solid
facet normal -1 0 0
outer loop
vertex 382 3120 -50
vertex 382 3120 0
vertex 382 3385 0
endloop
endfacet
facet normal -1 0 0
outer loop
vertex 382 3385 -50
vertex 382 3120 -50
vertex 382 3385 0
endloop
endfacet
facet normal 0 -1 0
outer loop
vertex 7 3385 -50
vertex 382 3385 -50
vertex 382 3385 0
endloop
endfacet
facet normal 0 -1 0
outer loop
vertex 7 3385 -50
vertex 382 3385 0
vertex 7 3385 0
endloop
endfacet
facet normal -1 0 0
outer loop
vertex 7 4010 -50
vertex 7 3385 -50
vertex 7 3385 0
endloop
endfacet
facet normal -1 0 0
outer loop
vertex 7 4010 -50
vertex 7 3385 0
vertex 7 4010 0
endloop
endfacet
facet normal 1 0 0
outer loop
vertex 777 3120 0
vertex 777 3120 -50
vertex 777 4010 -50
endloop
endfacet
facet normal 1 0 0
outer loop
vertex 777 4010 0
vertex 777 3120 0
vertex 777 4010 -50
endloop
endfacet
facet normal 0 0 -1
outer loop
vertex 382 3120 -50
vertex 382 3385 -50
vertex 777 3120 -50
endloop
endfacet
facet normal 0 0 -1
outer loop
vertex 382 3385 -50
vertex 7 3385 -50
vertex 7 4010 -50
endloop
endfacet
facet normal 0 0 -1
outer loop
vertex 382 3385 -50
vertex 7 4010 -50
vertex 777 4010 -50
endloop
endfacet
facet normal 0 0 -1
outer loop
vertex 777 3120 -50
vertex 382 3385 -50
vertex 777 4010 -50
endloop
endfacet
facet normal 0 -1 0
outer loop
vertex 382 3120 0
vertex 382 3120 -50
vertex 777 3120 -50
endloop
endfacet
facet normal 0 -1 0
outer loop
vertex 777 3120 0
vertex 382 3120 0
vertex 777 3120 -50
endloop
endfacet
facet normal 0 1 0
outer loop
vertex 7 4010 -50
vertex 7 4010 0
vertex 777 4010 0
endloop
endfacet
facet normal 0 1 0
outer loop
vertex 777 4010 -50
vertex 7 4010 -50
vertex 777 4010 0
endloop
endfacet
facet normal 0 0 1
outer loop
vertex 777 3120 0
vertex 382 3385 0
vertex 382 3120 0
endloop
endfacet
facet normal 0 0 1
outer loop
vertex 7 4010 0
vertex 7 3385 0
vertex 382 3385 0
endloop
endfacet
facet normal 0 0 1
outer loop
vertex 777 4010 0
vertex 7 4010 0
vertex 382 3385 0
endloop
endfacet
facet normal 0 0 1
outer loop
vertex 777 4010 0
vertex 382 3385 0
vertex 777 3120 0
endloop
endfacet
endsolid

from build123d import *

# Parameters (mm, degrees)
TABAN_FLAN_1_DEPTH         = 50
KES_EKSTR_ZYON1_DEPTH      = 4481.915196698
KES_EKSTR_ZYON1_DEPTH_BACK = 4481.915196698
IZIM2_W                    = 942
IZIM2_H                    = 710
IZIM3_W                    = 11
IZIM3_H                    = 3300
SEKME1_DEPTH               = 50
KES_EKSTR_ZYON2_DEPTH      = 4486.833255929
KES_EKSTR_ZYON2_DEPTH_BACK = 4486.833255929
IZIM4_W                    = 1520
IZIM4_H                    = 310
KES_EKSTR_ZYON3_DEPTH      = 4486.833255929
KES_EKSTR_ZYON3_DEPTH_BACK = 4486.833255929
IZIM6_W                    = 7
IZIM6_H                    = 2435
KES_EKSTR_ZYON4_DEPTH      = 4337.484751501
KES_EKSTR_ZYON4_DEPTH_BACK = 4337.484751501
IZIM7_W                    = 360
IZIM7_H                    = 1550
KES_EKSTR_ZYON5_DEPTH      = 4213.683230436
KES_EKSTR_ZYON5_DEPTH_BACK = 4213.683230436
IZIM8_W                    = 3
IZIM8_H                    = 1550
IZIM8_W_2                  = 58
IZIM8_H_2                  = 885
IZIM9_W                    = 905
IZIM9_H                    = 5
SEKME2_DEPTH               = 50
KES_EKSTR_ZYON6_DEPTH      = 4212.765544282
KES_EKSTR_ZYON6_DEPTH_BACK = 4212.765544282
IZIM10_W                   = 101
IZIM10_H                   = 1555
KES_EKSTR_ZYON7_DEPTH      = 4183.008608313
KES_EKSTR_ZYON7_DEPTH_BACK = 4183.008608313
IZIM11_W                   = 409
IZIM11_H                   = 1555
KES_EKSTR_ZYON8_DEPTH      = 4085.890329005
KES_EKSTR_ZYON8_DEPTH_BACK = 4085.890329005
IZIM13_W                   = 395
IZIM13_H                   = 665


# Sheet-metal steps are written as plain solids
with BuildPart() as part:
    # Çizim1 → Taban-Flanş1 (new body)
    with BuildSketch(Plane.XY):
        Polygon((0, 0), (1427, 0), (1427, 710), (1999, 710), (1999, 4010), (0, 4010), align=None)
    extrude(amount=-TABAN_FLAN_1_DEPTH)

    # Çizim2 → Kes-Ekstrüzyon1 (cut, two sides: drawn at the far end of the back side and taken through both)
    with BuildSketch(Plane.XY.offset(-KES_EKSTR_ZYON1_DEPTH_BACK)):
        with Locations((956, 355)):
            Rectangle(IZIM2_W, IZIM2_H)
    extrude(amount=KES_EKSTR_ZYON1_DEPTH + KES_EKSTR_ZYON1_DEPTH_BACK, mode=Mode.SUBTRACT)

    # Çizim3 → Sekme1 (add)
    with BuildSketch(Plane.XY):
        with Locations((2004.5, 2360)):
            Rectangle(IZIM3_W, IZIM3_H)
    extrude(amount=-SEKME1_DEPTH)

    # Çizim4 → Kes-Ekstrüzyon2 (cut, two sides: drawn at the far end of the back side and taken through both)
    with BuildSketch(Plane.XY.offset(-KES_EKSTR_ZYON2_DEPTH_BACK)):
        with Locations((1250, 865)):
            Rectangle(IZIM4_W, IZIM4_H)
    extrude(amount=KES_EKSTR_ZYON2_DEPTH + KES_EKSTR_ZYON2_DEPTH_BACK, mode=Mode.SUBTRACT)

    # Çizim6 → Kes-Ekstrüzyon3 (cut, two sides: drawn at the far end of the back side and taken through both)
    with BuildSketch(Plane.XY.offset(-KES_EKSTR_ZYON3_DEPTH_BACK)):
        Polygon((440, 2460), (440, 1575), (440, 1020), (490, 1020), (2010, 1020), (2010, 4010), (1650, 4010), (1650, 2460), align=None)
        Polygon((7, 1575), (0, 1575), (0, 0), (485, 0), (485, 710), (490, 710), (490, 1020), (440, 1020), (440, 1575), align=None)
        with Locations((3.5, 2792.5)):
            Rectangle(IZIM6_W, IZIM6_H)
    extrude(amount=KES_EKSTR_ZYON3_DEPTH + KES_EKSTR_ZYON3_DEPTH_BACK, mode=Mode.SUBTRACT)

    # Çizim7 → Kes-Ekstrüzyon4 (cut, two sides: drawn at the far end of the back side and taken through both)
    with BuildSketch(Plane.XY.offset(-KES_EKSTR_ZYON4_DEPTH_BACK)):
        with Locations((1470, 3235)):
            Rectangle(IZIM7_W, IZIM7_H)
    extrude(amount=KES_EKSTR_ZYON4_DEPTH + KES_EKSTR_ZYON4_DEPTH_BACK, mode=Mode.SUBTRACT)

    # Çizim8 → Kes-Ekstrüzyon5 (cut, two sides: drawn at the far end of the back side and taken through both)
    with BuildSketch(Plane.XY.offset(-KES_EKSTR_ZYON5_DEPTH_BACK)):
        Polygon((382, 3385), (7, 3385), (7, 1575), (382, 1575), (382, 2460), align=None)
        with Locations((1288.5, 3235)):
            Rectangle(IZIM8_W, IZIM8_H)
        with Locations((411, 2017.5)):
            Rectangle(IZIM8_W_2, IZIM8_H_2)
    extrude(amount=KES_EKSTR_ZYON5_DEPTH + KES_EKSTR_ZYON5_DEPTH_BACK, mode=Mode.SUBTRACT)

    # Çizim9 → Sekme2 (add)
    with BuildSketch(Plane.XY):
        with Locations((834.5, 2457.5)):
            Rectangle(IZIM9_W, IZIM9_H)
    extrude(amount=-SEKME2_DEPTH)

    # Çizim10 → Kes-Ekstrüzyon6 (cut, two sides: drawn at the far end of the back side and taken through both)
    with BuildSketch(Plane.XY.offset(-KES_EKSTR_ZYON6_DEPTH_BACK)):
        with Locations((1236.5, 3232.5)):
            Rectangle(IZIM10_W, IZIM10_H)
    extrude(amount=KES_EKSTR_ZYON6_DEPTH + KES_EKSTR_ZYON6_DEPTH_BACK, mode=Mode.SUBTRACT)

    # Çizim11 → Kes-Ekstrüzyon7 (cut, two sides: drawn at the far end of the back side and taken through both)
    with BuildSketch(Plane.XY.offset(-KES_EKSTR_ZYON7_DEPTH_BACK)):
        with Locations((981.5, 3232.5)):
            Rectangle(IZIM11_W, IZIM11_H)
    extrude(amount=KES_EKSTR_ZYON7_DEPTH + KES_EKSTR_ZYON7_DEPTH_BACK, mode=Mode.SUBTRACT)

    # Çizim13 → Kes-Ekstrüzyon8 (cut, two sides: drawn at the far end of the back side and taken through both)
    with BuildSketch(Plane.XY.offset(-KES_EKSTR_ZYON8_DEPTH_BACK)):
        with Locations((579.5, 2787.5)):
            Rectangle(IZIM13_W, IZIM13_H)
    extrude(amount=KES_EKSTR_ZYON8_DEPTH + KES_EKSTR_ZYON8_DEPTH_BACK, mode=Mode.SUBTRACT)


solid = part.part
